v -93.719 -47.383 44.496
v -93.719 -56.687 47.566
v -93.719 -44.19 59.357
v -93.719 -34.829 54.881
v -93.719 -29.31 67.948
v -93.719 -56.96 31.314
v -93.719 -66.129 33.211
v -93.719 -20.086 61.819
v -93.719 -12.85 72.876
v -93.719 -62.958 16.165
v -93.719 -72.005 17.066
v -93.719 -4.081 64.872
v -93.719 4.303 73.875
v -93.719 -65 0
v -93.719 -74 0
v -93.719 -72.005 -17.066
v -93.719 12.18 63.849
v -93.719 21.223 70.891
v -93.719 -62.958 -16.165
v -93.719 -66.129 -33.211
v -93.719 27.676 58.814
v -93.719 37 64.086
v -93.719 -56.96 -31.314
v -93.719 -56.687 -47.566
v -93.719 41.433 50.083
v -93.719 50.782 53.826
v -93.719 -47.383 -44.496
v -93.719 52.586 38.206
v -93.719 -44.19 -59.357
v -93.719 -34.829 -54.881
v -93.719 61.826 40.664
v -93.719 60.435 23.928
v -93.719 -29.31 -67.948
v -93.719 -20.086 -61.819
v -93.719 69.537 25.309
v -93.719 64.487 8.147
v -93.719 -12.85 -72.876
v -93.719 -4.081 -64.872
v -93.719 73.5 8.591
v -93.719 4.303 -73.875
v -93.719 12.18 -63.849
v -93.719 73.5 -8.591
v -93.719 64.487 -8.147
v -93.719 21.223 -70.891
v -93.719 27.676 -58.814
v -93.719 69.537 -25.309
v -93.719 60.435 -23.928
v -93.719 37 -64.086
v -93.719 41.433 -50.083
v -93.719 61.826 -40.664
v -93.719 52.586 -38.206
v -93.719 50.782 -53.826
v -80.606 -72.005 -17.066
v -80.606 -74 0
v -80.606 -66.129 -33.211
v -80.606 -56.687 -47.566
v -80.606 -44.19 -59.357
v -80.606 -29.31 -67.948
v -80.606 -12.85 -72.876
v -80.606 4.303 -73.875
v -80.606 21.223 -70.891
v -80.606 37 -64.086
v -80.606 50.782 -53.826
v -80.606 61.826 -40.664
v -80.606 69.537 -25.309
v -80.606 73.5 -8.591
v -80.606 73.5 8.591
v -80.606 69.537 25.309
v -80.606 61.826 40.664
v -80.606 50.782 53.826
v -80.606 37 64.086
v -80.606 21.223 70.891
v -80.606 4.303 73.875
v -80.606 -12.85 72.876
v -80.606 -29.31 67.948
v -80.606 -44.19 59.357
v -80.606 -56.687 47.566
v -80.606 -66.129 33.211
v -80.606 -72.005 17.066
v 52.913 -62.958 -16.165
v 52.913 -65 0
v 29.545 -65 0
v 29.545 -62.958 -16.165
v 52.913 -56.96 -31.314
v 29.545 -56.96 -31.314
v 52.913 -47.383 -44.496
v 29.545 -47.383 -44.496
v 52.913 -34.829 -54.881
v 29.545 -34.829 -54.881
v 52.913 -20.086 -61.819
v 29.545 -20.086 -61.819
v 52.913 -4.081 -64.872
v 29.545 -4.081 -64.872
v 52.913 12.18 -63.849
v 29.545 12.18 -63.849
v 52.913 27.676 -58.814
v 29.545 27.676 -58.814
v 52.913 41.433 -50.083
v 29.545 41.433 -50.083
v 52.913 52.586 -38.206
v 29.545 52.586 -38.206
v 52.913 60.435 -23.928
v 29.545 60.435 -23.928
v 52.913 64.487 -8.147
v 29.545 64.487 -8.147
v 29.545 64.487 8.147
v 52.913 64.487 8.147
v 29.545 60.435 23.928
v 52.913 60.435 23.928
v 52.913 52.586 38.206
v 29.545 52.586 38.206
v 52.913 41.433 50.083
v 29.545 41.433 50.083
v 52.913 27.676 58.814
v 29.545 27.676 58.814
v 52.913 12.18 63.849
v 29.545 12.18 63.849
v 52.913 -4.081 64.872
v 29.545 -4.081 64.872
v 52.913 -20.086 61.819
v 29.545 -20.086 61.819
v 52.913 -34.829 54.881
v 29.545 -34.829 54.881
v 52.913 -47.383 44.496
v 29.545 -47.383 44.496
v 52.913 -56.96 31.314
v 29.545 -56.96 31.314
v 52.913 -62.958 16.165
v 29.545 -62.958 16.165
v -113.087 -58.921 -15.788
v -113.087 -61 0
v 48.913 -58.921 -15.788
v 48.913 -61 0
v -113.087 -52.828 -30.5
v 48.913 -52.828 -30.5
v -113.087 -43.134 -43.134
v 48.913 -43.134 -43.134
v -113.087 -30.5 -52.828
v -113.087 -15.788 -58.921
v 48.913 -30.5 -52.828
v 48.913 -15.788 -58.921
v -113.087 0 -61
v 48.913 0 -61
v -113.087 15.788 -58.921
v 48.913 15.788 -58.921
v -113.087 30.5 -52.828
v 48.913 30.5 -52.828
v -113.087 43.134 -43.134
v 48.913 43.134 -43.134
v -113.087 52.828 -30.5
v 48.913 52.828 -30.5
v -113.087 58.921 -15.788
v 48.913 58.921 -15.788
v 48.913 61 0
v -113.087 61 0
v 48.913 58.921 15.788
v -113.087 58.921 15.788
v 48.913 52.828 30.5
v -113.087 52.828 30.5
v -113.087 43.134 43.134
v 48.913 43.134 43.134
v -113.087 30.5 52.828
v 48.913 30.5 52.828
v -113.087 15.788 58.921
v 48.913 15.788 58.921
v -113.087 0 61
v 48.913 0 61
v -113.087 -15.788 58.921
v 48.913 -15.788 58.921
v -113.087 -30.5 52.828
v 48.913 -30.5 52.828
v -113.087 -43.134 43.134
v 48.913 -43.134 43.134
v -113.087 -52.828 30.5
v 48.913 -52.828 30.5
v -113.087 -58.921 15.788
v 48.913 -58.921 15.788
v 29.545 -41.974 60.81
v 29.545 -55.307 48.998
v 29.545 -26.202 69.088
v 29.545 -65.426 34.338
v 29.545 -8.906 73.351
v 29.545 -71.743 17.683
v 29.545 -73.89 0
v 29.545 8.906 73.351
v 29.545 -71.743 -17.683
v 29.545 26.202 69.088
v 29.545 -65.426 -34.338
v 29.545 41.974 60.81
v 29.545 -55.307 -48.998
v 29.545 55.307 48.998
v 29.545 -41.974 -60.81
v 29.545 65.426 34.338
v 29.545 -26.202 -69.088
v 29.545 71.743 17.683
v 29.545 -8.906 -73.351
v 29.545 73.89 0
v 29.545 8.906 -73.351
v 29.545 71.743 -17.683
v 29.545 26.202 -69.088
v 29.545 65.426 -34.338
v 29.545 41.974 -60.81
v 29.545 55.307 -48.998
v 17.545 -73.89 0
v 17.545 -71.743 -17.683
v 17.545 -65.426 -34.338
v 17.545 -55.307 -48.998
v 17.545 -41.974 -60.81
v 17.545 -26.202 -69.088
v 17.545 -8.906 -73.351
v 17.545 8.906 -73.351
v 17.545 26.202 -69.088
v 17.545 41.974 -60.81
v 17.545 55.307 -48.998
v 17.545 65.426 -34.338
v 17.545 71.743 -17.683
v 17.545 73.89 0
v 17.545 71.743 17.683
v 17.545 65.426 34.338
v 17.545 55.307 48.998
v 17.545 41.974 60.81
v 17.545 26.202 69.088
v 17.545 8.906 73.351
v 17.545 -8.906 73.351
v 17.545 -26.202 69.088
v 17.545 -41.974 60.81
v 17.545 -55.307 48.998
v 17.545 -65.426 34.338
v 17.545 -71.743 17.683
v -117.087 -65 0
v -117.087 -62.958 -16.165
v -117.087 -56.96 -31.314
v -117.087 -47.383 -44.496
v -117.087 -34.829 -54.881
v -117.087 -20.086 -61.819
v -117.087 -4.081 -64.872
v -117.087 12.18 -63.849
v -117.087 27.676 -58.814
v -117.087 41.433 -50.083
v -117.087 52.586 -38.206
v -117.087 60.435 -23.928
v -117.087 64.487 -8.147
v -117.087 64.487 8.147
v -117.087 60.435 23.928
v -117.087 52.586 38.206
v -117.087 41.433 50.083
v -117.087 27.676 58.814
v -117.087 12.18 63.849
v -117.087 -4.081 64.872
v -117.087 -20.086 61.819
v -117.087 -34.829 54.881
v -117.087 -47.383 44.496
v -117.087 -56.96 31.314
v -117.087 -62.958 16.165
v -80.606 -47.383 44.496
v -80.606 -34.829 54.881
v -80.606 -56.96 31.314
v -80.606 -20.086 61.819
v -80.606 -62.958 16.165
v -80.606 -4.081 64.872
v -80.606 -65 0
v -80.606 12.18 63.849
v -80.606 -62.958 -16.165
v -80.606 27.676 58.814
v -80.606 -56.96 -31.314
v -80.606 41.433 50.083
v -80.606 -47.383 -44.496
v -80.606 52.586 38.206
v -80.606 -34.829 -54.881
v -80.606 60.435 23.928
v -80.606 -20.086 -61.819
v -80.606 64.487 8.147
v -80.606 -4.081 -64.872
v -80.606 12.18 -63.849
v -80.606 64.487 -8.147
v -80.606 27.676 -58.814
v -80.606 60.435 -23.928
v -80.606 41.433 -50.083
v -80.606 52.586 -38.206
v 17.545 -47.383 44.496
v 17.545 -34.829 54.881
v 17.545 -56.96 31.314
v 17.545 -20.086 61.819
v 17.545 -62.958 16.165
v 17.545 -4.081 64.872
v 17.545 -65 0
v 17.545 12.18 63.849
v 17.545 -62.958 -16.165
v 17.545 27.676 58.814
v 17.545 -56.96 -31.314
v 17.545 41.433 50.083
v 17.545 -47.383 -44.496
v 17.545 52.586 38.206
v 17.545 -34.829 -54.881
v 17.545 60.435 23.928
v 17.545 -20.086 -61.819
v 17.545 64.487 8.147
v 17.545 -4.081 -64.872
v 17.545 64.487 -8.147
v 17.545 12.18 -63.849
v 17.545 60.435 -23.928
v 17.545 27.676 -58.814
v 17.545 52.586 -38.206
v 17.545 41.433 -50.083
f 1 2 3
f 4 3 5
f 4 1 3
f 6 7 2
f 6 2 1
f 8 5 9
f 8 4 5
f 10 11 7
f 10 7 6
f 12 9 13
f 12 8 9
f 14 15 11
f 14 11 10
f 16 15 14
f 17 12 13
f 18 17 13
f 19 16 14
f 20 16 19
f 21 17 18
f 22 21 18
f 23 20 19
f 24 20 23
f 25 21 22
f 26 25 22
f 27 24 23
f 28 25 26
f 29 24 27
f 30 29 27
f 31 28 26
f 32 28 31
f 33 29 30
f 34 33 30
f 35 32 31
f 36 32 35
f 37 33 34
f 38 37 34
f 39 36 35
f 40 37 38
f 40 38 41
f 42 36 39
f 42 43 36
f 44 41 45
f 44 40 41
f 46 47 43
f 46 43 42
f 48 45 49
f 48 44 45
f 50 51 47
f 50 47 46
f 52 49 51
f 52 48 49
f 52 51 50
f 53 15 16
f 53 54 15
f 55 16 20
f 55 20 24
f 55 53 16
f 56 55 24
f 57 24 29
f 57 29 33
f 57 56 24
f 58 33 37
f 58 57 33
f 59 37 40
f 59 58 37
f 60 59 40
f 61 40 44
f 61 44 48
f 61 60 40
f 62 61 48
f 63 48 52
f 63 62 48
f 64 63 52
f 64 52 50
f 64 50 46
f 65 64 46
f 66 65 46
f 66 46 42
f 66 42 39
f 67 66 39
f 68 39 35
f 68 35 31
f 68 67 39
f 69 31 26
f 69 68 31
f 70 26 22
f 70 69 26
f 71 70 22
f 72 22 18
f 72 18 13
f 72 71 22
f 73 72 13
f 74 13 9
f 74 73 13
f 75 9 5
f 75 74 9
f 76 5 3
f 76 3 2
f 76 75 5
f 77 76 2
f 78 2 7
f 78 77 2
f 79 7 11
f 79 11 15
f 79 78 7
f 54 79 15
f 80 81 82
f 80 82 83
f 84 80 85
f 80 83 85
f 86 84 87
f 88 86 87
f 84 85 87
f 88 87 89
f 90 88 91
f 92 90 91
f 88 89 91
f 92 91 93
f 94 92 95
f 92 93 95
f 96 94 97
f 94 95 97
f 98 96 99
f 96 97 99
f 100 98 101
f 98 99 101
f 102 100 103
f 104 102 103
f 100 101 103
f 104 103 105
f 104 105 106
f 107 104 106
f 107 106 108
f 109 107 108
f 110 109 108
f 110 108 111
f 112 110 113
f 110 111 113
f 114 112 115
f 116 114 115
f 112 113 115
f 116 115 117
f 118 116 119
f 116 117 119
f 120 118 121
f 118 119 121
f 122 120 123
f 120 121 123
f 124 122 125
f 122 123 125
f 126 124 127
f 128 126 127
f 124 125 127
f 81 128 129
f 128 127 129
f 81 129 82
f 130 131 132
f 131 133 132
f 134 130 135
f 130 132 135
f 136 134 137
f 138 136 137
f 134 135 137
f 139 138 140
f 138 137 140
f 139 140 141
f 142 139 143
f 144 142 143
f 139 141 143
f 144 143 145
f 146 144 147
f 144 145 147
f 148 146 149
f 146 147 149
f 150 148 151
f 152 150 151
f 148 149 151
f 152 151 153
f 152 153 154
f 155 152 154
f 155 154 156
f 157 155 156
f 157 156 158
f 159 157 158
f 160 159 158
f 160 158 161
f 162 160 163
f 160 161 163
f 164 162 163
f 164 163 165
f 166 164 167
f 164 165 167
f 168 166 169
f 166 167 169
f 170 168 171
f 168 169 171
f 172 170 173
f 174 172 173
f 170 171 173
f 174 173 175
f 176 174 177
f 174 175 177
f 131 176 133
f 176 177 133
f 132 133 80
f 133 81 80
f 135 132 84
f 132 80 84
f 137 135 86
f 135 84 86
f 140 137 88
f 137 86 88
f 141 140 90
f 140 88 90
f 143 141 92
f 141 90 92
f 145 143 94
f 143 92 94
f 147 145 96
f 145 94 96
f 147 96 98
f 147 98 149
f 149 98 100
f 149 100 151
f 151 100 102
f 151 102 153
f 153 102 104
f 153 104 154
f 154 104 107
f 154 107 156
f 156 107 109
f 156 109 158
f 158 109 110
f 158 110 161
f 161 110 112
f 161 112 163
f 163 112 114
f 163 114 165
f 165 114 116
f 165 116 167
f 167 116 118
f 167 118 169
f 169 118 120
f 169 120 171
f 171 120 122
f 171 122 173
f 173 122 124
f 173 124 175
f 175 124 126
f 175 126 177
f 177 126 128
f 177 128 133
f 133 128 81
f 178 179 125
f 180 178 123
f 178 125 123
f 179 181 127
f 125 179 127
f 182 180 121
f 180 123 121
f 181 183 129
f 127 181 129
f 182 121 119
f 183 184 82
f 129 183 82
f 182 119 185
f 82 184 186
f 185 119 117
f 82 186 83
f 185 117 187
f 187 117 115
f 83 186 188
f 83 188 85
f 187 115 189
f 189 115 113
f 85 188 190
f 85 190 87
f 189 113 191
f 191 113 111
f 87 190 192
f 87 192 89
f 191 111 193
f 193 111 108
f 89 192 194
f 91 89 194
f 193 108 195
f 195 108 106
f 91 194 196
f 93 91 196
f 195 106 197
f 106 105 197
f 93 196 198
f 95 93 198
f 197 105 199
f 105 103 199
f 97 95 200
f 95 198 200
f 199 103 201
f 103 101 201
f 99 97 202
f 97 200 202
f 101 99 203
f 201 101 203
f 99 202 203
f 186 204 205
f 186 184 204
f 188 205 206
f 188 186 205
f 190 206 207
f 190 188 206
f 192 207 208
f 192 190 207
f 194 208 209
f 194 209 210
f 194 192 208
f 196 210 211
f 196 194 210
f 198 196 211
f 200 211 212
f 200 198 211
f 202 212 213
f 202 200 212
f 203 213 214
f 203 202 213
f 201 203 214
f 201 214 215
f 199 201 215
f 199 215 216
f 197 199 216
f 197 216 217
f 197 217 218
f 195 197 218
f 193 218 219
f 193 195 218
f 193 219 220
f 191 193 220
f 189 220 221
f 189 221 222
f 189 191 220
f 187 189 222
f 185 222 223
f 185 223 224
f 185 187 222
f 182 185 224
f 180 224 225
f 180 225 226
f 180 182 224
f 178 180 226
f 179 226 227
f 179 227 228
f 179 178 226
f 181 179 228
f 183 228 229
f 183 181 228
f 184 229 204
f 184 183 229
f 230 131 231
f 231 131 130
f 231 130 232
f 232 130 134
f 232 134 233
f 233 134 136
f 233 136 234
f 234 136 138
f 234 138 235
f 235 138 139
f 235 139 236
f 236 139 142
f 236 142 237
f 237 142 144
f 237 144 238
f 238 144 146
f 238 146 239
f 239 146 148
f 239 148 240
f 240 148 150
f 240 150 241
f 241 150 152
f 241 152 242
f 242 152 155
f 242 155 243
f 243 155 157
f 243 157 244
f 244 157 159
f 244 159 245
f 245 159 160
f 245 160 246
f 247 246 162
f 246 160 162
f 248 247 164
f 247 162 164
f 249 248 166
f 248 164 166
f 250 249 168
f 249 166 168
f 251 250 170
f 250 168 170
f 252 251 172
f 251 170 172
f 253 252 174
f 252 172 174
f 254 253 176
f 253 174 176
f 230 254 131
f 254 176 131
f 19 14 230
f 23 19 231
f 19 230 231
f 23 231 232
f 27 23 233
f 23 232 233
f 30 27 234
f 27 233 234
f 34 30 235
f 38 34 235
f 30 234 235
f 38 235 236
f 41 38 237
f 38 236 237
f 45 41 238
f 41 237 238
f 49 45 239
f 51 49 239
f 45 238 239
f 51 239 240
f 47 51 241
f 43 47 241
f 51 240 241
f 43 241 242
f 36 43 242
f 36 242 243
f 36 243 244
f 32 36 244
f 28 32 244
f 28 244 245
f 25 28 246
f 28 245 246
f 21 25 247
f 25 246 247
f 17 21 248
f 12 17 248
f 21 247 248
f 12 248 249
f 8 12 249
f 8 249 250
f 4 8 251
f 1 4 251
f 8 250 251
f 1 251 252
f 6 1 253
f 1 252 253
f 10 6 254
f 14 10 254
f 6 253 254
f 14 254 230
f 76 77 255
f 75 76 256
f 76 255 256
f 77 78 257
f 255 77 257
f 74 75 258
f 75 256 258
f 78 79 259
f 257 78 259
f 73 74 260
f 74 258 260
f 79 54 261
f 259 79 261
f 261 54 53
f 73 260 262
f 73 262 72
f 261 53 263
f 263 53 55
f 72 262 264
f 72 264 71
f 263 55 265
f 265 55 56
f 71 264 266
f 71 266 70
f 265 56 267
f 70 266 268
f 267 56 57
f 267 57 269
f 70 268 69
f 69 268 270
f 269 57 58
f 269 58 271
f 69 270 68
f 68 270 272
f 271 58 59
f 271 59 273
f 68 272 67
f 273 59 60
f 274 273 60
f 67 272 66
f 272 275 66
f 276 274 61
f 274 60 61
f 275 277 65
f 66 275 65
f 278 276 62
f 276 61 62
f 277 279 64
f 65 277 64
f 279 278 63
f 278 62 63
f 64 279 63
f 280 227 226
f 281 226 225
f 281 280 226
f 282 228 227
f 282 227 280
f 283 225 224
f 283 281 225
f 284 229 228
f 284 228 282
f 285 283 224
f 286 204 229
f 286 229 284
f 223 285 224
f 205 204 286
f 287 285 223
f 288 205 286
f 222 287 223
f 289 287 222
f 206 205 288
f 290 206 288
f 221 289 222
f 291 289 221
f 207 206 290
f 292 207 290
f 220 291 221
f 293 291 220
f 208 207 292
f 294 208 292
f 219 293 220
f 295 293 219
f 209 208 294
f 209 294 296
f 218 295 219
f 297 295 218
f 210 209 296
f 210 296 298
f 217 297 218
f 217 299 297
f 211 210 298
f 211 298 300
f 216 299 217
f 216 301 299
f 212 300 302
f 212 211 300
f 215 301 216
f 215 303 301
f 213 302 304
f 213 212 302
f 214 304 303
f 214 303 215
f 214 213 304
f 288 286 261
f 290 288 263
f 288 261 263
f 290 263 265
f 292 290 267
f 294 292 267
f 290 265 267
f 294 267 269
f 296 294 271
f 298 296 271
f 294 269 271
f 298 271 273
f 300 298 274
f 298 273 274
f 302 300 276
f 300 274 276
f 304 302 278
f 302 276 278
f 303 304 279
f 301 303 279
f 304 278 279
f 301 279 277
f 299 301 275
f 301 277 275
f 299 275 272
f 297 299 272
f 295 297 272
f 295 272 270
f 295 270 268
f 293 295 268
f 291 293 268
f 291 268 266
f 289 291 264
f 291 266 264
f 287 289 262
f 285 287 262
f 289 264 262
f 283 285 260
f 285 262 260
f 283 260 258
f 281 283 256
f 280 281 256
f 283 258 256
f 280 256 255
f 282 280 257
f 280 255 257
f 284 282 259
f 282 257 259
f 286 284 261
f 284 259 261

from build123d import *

# Parameters (mm, degrees)
SKETCH9_W  = 13.112773862
SKETCH9_H  = 9
SKETCH11_W = 12
SKETCH11_H = 8.89


with BuildPart() as part:
    # Sketch1 → Revolve2 (revolve)
    with BuildSketch(Plane.XY, mode=Mode.PRIVATE) as revolve2_sk:
        Polygon((52.912966218, 65), (-117.087033782, 65), (-113.087033782, 61), (48.912966218, 61), align=None)
    revolve(revolve2_sk.sketch.rotate(Axis((-117.087033782, 0, 0), (1, 0, 0)), 180), axis=Axis((-117.087033782, 0, 0), (1, 0, 0)))

    # Sketch9 → Revolve4 (revolve)
    with BuildSketch(Plane.XY, mode=Mode.PRIVATE) as revolve4_sk:
        with Locations((-87.162646851, 69.5)):
            Rectangle(SKETCH9_W, SKETCH9_H)
    revolve(revolve4_sk.sketch.rotate(Axis((-161.549470518, 0, 0), (1, 0, 0)), 180), axis=Axis((-161.549470518, 0, 0), (1, 0, 0)))

    # Sketch11 → Revolve5 (revolve)
    with BuildSketch(Plane.XY, mode=Mode.PRIVATE) as revolve5_sk:
        with Locations((23.544966218, 69.445)):
            Rectangle(SKETCH11_W, SKETCH11_H)
    revolve(revolve5_sk.sketch.rotate(Axis((-147.745174043, 0, 0), (1, 0, 0)), 180), axis=Axis((-147.745174043, 0, 0), (1, 0, 0)))


solid = part.part
